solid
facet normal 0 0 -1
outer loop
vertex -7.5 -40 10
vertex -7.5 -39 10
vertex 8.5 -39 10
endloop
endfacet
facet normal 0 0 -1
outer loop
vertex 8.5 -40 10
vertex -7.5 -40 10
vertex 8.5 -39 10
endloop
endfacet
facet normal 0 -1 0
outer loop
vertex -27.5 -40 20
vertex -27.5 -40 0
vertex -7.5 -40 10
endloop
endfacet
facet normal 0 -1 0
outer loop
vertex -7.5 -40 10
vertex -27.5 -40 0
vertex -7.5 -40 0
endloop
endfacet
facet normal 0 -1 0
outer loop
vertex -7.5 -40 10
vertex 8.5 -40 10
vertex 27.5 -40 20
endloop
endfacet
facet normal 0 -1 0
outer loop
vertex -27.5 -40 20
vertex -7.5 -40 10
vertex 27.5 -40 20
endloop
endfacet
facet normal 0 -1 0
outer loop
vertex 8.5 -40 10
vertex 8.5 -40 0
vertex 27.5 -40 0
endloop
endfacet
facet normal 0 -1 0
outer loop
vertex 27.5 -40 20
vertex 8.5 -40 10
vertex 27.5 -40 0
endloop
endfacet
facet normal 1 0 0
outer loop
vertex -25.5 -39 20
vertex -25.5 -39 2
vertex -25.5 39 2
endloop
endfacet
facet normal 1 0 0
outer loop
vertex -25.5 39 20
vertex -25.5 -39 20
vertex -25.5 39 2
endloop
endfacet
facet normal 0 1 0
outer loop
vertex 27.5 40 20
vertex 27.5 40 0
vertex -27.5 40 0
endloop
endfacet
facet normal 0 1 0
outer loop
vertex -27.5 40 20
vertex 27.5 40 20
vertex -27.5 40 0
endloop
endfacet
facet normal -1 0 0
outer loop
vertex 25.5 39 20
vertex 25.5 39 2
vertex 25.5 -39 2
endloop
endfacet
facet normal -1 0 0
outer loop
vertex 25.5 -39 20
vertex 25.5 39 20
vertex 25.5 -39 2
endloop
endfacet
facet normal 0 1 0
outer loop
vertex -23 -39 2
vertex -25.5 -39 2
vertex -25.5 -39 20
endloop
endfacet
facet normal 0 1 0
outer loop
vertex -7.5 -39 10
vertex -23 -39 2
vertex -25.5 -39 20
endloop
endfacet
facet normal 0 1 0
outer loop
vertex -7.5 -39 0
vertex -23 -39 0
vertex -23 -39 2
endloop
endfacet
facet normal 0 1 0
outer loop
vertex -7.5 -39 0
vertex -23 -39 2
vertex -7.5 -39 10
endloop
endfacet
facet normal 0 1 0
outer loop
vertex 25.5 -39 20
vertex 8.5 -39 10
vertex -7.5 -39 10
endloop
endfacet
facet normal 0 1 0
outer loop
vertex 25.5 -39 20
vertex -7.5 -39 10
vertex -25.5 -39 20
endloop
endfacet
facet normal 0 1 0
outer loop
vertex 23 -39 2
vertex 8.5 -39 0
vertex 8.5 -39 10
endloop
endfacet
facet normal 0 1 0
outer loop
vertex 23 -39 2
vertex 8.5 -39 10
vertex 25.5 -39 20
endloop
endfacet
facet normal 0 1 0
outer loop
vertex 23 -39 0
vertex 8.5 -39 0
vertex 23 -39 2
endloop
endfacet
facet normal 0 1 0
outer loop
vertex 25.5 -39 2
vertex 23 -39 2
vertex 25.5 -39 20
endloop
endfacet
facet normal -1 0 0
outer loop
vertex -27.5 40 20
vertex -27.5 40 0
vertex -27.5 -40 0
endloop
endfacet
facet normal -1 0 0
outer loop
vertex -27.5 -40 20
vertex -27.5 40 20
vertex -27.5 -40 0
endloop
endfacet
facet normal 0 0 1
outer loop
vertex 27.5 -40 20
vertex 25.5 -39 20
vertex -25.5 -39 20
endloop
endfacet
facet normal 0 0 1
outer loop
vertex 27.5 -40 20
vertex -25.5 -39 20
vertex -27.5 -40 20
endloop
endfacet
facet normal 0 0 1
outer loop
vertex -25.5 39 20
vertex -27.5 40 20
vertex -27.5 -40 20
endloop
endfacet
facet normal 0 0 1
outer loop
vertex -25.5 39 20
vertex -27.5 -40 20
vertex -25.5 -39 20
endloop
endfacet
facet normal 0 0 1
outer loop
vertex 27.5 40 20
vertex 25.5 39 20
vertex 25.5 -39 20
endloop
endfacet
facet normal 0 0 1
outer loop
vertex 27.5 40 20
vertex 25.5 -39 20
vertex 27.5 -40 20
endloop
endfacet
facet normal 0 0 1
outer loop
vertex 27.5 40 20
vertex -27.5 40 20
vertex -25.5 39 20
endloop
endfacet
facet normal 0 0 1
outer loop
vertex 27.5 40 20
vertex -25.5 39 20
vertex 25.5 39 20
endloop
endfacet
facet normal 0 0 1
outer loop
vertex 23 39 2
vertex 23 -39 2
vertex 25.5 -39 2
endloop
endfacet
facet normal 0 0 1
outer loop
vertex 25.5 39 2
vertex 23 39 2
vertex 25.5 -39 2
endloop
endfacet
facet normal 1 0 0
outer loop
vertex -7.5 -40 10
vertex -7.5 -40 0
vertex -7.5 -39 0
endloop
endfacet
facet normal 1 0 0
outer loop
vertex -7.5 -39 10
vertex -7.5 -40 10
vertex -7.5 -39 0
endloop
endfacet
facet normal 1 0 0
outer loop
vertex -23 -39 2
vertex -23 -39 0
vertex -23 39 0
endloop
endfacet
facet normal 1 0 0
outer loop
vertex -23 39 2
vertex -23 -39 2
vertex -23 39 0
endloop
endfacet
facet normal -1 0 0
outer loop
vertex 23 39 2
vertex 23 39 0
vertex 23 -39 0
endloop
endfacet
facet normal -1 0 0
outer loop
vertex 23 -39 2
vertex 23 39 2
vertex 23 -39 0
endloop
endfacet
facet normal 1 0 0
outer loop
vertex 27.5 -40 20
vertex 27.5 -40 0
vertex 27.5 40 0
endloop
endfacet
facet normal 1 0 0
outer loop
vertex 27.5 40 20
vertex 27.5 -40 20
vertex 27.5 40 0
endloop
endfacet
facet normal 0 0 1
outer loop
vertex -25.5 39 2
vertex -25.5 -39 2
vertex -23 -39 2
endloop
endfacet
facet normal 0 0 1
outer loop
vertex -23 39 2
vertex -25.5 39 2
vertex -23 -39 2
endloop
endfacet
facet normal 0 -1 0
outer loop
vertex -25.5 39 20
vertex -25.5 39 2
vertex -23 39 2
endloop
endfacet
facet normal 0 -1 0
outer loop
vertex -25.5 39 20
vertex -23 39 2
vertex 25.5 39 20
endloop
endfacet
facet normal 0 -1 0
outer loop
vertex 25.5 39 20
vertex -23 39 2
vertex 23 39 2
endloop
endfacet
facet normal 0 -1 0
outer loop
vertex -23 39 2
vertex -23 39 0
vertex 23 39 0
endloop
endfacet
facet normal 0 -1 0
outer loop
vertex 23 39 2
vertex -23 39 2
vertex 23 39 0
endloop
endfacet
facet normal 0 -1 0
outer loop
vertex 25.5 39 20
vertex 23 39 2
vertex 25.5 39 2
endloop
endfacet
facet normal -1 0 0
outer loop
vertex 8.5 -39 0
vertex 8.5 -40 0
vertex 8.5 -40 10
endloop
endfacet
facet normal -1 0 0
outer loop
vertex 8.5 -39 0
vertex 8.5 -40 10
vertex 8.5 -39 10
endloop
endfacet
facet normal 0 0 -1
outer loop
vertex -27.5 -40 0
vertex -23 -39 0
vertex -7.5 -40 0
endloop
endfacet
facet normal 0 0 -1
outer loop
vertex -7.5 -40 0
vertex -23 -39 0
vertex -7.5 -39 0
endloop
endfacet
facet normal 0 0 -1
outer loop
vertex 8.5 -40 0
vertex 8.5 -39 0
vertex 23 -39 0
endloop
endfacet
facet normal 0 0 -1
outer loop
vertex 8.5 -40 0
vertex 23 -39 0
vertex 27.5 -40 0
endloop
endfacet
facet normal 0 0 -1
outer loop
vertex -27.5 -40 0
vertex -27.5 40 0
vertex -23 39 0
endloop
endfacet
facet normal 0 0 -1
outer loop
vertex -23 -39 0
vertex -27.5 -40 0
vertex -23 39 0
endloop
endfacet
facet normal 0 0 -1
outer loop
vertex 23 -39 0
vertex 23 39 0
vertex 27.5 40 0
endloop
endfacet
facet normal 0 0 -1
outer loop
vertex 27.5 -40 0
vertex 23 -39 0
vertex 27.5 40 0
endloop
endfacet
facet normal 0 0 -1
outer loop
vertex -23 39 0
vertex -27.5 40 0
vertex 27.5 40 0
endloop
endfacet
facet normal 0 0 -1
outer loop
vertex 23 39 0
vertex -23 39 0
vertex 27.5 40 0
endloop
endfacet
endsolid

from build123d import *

# Parameters (mm, degrees)
F1_DEPTH = 2
F2_DEPTH = 20
F0_W     = 16
F0_H     = 1
F3_DEPTH = 20
F4_DEPTH = 10


with BuildPart() as f1:
    # F0 (on Top) → F1 (new body)
    with BuildSketch(Plane.XY):
        Polygon((-23, -39), (-23, -35), (-23, 35), (-23, 39), (-25.5, 39), (-25.5, -39), align=None)
        Polygon((25.5, -39), (23, -39), (8.5, -39), (8.5, -40), (27.5, -40), (27.5, 40), (-27.5, 40), (-27.5, -40), (-7.5, -40), (-7.5, -39), (-23, -39), (-25.5, -39), (-25.5, 39), (-23, 39), (23, 39), (25.5, 39), align=None)
        Polygon((23, 35), (23, -35), (23, -39), (25.5, -39), (25.5, 39), (23, 39), align=None)
    extrude(amount=F1_DEPTH)

    # F0 (on Top) → F2 (join)
    with BuildSketch(Plane.XY):
        Polygon((25.5, -39), (23, -39), (8.5, -39), (8.5, -40), (27.5, -40), (27.5, 40), (-27.5, 40), (-27.5, -40), (-7.5, -40), (-7.5, -39), (-23, -39), (-25.5, -39), (-25.5, 39), (-23, 39), (23, 39), (25.5, 39), align=None)
    extrude(amount=F2_DEPTH)

    # F0 (on Top) → F3 (join)
    with BuildSketch(Plane.XY):
        with Locations((0.5, -39.5)):
            Rectangle(F0_W, F0_H)
    extrude(amount=F3_DEPTH)

    # F0 (on Top) → F4 (cut)
    with BuildSketch(Plane.XY):
        with Locations((0.5, -39.5)):
            Rectangle(F0_W, F0_H)
    extrude(amount=F4_DEPTH, mode=Mode.SUBTRACT)


solid = f1.part
